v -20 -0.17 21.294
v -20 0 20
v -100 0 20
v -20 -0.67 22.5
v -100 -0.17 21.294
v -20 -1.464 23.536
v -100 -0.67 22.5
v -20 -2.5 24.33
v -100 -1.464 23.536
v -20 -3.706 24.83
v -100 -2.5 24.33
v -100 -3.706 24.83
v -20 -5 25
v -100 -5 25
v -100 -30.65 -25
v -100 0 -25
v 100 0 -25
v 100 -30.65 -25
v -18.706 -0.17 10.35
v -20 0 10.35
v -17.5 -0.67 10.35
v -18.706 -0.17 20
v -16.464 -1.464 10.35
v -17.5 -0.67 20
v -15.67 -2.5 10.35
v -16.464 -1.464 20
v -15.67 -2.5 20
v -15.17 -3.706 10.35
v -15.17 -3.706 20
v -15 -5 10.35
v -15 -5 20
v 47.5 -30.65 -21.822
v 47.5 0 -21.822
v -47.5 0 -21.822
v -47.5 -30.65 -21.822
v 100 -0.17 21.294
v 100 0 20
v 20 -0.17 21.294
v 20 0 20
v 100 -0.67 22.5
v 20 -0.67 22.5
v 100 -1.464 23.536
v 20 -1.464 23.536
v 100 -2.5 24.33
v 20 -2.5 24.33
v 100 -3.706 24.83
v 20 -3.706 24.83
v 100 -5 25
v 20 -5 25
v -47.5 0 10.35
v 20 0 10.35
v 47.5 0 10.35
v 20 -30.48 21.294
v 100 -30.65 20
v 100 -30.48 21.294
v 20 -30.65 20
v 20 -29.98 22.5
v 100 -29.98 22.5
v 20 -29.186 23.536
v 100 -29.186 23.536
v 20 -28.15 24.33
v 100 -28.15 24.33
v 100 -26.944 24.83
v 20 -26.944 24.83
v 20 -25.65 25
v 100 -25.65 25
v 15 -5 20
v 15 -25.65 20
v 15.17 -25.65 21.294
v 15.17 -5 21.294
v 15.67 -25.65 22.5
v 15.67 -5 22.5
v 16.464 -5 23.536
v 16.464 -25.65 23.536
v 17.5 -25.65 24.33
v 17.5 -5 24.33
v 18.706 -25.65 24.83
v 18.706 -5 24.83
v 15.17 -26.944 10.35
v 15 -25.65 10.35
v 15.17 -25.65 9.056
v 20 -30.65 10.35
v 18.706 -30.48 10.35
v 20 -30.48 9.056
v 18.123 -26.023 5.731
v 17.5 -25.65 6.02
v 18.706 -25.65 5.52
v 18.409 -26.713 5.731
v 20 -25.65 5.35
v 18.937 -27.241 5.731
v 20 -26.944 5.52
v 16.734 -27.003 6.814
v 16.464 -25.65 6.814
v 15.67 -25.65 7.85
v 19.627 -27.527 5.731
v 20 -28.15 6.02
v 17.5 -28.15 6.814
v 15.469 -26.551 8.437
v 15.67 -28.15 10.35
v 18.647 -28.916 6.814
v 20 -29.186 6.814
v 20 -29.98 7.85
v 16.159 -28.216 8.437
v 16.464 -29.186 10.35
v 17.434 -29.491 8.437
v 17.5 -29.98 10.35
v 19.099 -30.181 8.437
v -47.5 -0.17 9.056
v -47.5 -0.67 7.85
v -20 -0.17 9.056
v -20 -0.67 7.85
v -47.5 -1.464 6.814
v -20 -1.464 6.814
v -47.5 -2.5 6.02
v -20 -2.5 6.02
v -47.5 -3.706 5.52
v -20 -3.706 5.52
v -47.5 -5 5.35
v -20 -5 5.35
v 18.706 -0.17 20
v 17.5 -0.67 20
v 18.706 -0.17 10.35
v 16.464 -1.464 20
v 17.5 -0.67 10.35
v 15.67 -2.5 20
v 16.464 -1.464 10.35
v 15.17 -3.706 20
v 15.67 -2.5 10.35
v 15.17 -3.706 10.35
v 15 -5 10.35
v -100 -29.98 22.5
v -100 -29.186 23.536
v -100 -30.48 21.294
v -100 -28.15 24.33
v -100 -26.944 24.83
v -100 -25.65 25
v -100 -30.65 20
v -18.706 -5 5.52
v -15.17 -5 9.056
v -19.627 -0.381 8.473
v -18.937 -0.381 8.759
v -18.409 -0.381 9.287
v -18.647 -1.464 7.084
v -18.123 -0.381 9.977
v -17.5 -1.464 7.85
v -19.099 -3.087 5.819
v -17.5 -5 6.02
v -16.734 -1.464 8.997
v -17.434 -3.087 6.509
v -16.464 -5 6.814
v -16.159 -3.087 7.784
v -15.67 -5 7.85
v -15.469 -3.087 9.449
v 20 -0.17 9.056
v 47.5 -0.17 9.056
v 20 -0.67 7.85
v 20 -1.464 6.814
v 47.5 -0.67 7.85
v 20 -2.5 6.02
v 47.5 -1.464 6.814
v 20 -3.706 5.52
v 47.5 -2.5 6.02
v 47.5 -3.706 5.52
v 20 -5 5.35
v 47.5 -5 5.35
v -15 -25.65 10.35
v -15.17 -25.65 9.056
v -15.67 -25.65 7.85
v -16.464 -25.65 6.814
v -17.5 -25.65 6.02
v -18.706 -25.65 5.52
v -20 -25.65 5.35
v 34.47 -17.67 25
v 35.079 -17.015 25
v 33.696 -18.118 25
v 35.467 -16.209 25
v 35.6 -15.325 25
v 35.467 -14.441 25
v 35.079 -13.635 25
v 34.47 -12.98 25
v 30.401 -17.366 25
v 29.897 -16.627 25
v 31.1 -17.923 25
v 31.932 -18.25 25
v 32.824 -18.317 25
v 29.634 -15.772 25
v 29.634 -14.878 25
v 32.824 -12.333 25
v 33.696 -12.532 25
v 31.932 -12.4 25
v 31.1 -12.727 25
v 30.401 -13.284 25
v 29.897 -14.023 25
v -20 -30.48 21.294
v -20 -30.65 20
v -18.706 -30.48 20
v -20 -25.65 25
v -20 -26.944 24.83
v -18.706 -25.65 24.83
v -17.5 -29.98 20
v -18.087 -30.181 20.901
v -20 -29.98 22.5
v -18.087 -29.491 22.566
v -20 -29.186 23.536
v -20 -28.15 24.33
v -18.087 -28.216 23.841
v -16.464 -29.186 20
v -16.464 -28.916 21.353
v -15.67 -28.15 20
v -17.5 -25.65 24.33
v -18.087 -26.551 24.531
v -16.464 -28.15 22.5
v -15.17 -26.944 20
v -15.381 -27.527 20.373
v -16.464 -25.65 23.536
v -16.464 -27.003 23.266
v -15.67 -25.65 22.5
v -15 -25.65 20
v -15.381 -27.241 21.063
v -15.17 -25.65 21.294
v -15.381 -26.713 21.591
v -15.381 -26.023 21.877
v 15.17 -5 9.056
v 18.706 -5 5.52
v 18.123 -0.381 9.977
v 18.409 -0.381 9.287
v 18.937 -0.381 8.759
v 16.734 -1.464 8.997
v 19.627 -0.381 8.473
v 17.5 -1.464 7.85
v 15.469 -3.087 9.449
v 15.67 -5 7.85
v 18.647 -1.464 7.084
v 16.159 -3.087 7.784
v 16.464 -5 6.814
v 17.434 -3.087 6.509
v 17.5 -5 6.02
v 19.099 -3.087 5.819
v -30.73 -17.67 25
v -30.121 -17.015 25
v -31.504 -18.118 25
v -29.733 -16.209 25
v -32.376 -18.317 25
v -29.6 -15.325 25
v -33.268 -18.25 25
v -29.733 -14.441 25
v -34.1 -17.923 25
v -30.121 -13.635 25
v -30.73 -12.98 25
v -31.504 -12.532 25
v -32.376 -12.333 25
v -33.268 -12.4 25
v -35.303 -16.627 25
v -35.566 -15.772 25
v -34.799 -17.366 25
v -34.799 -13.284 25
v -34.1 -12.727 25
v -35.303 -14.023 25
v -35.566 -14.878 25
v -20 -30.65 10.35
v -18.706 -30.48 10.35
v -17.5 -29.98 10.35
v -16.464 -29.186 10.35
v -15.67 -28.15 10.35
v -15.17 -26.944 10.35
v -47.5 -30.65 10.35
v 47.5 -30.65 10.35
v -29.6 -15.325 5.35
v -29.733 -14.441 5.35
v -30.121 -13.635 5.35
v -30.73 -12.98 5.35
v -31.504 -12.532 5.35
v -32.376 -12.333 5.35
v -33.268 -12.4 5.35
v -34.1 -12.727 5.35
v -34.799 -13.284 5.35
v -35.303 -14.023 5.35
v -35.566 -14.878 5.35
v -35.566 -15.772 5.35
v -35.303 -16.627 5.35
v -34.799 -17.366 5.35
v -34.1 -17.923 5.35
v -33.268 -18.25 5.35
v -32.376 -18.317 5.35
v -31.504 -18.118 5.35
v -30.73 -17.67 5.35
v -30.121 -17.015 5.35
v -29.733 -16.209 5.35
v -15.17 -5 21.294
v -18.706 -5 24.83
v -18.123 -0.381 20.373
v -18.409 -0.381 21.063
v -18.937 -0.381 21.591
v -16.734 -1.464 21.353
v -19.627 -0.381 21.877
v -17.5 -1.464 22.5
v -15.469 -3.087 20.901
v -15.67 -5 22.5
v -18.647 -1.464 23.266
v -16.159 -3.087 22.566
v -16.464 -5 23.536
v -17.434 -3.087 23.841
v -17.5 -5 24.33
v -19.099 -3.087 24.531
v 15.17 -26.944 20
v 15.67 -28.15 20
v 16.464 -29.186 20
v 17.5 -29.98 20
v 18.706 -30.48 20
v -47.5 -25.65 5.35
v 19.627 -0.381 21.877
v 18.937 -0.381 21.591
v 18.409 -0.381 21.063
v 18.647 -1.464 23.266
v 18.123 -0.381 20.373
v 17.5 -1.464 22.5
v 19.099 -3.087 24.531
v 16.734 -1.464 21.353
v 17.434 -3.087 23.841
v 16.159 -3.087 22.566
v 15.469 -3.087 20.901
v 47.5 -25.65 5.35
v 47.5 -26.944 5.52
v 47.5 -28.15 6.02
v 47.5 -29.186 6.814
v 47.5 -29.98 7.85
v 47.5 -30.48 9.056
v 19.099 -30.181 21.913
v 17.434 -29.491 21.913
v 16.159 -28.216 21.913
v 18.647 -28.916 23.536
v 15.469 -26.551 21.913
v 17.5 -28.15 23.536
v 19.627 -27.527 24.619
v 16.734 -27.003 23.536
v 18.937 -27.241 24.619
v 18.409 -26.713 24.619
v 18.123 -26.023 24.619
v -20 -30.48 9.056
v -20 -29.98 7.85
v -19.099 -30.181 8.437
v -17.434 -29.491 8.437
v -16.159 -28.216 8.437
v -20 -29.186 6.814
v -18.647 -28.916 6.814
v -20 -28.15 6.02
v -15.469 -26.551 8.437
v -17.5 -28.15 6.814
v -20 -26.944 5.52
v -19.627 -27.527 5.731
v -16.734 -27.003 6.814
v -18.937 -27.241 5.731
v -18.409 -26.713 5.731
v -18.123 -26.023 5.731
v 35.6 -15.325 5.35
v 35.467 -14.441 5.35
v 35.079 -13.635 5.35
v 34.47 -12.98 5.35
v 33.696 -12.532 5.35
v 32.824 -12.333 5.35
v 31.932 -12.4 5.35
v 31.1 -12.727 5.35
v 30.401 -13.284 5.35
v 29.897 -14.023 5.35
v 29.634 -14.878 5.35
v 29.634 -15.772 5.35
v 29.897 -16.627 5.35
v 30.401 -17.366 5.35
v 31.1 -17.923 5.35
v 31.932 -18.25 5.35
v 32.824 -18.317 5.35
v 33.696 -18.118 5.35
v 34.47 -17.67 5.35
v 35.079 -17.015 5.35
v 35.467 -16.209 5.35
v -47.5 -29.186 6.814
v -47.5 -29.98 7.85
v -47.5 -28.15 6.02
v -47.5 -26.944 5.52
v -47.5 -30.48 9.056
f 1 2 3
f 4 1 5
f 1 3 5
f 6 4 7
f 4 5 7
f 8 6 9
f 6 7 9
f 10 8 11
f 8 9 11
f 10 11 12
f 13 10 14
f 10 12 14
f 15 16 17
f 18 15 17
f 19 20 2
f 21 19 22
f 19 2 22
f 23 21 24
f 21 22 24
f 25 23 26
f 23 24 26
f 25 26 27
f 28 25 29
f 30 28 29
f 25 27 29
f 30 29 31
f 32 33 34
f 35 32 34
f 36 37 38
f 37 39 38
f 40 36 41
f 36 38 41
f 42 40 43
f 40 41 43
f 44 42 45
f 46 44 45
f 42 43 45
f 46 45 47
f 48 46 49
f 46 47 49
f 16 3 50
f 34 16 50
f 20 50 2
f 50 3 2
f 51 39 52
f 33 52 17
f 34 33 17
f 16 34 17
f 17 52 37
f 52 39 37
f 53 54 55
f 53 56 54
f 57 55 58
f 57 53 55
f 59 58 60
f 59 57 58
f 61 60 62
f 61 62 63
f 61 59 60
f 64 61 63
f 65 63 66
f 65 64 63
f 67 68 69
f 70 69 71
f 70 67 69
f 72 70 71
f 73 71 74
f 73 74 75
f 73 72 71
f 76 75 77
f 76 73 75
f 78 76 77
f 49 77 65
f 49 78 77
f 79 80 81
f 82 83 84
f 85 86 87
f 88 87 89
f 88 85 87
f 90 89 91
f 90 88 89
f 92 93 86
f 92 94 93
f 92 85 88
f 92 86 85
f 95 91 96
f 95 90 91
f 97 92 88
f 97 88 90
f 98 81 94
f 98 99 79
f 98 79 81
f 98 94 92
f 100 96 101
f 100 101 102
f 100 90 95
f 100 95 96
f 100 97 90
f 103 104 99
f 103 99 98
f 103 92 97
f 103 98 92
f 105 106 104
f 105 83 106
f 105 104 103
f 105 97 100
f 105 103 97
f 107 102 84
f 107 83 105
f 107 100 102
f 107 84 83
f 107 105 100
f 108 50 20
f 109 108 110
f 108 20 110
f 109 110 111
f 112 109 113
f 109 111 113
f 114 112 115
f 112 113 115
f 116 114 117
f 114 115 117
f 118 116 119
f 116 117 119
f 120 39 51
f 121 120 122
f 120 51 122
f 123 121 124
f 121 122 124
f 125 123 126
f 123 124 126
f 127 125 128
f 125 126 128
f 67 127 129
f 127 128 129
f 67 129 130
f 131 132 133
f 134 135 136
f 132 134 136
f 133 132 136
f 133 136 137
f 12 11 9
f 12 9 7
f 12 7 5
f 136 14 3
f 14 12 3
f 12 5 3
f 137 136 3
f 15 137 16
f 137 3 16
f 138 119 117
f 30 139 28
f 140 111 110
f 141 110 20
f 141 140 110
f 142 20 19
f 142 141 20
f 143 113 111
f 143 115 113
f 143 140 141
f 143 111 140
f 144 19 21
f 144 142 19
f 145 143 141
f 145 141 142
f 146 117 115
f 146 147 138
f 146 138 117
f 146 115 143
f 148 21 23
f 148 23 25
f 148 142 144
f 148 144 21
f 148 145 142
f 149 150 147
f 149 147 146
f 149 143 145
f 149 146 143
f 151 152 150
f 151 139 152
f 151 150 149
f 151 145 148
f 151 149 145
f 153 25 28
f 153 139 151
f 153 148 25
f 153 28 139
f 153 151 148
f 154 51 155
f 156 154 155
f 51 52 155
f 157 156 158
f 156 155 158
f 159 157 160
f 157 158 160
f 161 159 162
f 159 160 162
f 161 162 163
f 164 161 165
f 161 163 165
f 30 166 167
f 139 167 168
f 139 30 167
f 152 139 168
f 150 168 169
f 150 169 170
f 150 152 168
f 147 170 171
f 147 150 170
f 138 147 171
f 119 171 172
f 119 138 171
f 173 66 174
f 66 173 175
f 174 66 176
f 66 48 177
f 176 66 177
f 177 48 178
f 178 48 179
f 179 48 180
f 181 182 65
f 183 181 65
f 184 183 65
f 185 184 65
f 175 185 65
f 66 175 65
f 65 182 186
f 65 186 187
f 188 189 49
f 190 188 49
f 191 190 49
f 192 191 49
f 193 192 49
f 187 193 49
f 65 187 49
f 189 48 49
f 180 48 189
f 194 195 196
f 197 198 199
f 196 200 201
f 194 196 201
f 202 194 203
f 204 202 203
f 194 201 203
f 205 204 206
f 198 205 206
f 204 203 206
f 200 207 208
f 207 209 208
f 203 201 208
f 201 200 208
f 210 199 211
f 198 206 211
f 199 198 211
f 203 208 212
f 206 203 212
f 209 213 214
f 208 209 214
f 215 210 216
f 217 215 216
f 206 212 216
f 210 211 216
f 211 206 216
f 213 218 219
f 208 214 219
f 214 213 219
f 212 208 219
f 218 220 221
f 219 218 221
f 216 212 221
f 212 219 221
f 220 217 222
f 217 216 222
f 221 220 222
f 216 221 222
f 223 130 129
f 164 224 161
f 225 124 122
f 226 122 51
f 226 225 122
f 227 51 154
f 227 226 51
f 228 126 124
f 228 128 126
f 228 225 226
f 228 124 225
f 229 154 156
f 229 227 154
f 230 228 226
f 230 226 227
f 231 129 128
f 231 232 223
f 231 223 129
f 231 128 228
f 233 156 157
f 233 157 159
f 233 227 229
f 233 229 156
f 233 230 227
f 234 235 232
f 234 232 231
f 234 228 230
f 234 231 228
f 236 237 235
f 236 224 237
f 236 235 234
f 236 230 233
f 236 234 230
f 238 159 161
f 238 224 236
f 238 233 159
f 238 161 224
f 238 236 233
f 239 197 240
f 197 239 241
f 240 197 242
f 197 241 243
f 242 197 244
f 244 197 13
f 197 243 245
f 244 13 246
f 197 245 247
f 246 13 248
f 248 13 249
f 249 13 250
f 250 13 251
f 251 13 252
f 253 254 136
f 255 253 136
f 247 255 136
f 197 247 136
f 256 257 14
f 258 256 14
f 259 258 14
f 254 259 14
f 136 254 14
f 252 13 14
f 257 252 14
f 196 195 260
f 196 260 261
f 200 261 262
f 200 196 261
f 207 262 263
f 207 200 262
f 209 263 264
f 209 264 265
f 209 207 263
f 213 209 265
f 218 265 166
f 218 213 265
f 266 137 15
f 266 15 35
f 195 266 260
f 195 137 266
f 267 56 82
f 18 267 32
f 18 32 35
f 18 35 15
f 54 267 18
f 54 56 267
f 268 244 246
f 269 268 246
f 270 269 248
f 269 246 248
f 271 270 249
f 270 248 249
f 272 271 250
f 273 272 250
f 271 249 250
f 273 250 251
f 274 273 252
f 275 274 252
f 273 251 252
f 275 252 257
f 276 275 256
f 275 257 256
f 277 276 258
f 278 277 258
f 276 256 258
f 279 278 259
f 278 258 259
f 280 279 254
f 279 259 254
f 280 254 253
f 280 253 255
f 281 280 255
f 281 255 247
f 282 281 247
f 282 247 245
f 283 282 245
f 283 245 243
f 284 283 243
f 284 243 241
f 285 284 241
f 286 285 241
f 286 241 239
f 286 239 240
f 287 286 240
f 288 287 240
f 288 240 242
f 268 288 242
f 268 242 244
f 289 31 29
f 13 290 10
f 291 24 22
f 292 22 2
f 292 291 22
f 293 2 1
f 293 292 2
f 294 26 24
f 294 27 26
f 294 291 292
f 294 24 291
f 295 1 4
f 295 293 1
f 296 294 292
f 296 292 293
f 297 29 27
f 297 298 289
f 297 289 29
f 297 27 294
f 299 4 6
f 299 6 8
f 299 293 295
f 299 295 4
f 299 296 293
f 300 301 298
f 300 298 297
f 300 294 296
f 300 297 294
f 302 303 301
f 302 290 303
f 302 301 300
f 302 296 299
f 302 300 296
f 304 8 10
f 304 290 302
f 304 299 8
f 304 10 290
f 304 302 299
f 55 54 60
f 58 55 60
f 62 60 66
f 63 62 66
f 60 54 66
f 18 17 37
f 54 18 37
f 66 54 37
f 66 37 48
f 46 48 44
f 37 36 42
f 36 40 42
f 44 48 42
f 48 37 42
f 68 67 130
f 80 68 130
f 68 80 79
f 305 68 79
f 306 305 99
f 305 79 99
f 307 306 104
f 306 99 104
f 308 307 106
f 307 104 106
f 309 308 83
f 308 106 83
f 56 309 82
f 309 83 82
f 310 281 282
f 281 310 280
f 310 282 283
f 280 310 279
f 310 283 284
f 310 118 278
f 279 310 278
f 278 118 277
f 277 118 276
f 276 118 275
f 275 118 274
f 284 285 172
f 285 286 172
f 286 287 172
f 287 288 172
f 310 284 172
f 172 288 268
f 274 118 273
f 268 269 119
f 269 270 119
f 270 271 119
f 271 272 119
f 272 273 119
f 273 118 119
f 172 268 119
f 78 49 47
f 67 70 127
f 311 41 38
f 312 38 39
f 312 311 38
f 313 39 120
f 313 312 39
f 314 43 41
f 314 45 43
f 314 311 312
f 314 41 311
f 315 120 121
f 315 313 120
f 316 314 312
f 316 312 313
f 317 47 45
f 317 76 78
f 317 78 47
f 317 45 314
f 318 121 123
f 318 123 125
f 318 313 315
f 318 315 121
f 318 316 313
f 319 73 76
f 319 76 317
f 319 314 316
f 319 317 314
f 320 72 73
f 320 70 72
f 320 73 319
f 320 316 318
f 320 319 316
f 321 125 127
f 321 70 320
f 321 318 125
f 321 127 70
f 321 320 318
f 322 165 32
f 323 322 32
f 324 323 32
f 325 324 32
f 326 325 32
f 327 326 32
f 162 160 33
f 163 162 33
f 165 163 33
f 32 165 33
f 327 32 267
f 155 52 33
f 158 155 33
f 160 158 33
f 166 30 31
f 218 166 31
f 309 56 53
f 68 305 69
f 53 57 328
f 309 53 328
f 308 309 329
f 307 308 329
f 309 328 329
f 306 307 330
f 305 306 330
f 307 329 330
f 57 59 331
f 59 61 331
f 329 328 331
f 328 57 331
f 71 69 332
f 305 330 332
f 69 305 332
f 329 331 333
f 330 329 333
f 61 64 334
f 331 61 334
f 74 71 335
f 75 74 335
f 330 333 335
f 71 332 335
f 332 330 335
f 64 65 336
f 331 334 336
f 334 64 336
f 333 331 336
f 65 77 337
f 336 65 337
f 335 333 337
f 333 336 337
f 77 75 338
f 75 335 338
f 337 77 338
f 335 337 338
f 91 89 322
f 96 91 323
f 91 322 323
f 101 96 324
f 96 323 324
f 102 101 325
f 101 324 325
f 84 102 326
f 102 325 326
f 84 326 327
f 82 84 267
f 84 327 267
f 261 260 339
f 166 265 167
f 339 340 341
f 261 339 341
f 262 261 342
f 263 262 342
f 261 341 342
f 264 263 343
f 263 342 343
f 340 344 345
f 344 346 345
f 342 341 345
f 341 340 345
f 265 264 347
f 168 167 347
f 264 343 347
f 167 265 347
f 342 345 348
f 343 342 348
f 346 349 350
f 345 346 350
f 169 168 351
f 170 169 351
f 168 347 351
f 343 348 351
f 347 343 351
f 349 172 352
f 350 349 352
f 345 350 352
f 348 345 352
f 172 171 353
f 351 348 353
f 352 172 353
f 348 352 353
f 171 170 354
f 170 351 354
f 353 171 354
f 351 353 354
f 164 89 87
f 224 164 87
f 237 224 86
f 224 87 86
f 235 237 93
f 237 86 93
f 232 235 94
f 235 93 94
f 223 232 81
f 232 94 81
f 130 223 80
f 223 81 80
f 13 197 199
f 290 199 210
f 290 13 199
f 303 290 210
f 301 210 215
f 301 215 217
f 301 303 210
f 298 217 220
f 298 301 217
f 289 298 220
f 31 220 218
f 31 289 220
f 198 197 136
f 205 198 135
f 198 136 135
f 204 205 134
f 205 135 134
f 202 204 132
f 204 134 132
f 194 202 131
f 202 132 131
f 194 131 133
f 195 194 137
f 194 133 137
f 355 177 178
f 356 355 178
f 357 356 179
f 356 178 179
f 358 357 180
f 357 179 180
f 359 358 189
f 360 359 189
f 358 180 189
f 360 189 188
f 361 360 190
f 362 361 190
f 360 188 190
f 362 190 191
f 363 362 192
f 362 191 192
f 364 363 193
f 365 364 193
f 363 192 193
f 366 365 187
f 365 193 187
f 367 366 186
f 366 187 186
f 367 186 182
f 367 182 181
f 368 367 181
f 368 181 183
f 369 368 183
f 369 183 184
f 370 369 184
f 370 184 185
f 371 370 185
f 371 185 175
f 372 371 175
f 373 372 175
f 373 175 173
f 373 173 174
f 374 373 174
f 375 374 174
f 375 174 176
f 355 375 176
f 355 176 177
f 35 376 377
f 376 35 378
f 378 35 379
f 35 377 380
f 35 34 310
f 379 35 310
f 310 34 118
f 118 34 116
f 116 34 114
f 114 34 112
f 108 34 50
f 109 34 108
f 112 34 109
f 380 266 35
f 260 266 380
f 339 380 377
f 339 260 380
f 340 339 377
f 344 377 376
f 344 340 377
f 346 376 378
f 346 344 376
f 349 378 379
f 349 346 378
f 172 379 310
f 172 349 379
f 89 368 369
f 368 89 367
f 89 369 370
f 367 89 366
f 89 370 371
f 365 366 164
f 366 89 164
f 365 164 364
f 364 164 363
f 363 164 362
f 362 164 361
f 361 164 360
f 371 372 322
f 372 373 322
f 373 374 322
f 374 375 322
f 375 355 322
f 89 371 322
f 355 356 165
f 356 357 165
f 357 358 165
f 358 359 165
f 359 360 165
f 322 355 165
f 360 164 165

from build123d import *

# Parameters (mm, degrees)
F1_DEPTH  = 30.65
F2_R      = 5
F3_R      = 5
F4_R      = 5
F5_R      = 5
F6_R      = 5
F7_R      = 5
F8_R      = 5
F9_R      = 5
F10_R     = 3
F11_DEPTH = 20


with BuildPart() as f1:
    # F0 (on Front) → F1 (new body)
    with BuildSketch(Plane.XZ):
        Polygon((-100, 25), (-100, -25), (100, -25), (100, 25), (15, 25), (15, 5.35), (47.5, 5.35), (47.5, -7.066266), (47.5, -21.822188), (0, -21.822188), (-47.5, -21.822188), (-47.5, -7.066266), (-47.5, 5.35), (-15, 5.35), (-15, 25), align=None)
    extrude(amount=F1_DEPTH)

    # F2
    f2_edges = [f1.edges().sort_by_distance(p)[0] for p in [
        (-57.5, -30.65, 25),
    ]]
    fillet(f2_edges, radius=F2_R)

    # F3
    f3_edges = [f1.edges().sort_by_distance(p)[0] for p in [
        (-15, -30.65, 12.675),
    ]]
    fillet(f3_edges, radius=F3_R)

    # F4
    f4_edges = [f1.edges().sort_by_distance(p)[0] for p in [
        (-33.75, -30.65, 5.35),
    ]]
    fillet(f4_edges, radius=F4_R)

    # F5
    f5_edges = [f1.edges().sort_by_distance(p)[0] for p in [
        (15, -30.65, 15.175),
    ]]
    fillet(f5_edges, radius=F5_R)

    # F6
    f6_edges = [f1.edges().sort_by_distance(p)[0] for p in [
        (33.75, -30.65, 5.35),
    ]]
    fillet(f6_edges, radius=F6_R)

    # F7
    f7_edges = [f1.edges().sort_by_distance(p)[0] for p in [
        (60, -30.65, 25),
    ]]
    fillet(f7_edges, radius=F7_R)

    # F8
    f8_edges = [f1.edges().sort_by_distance(p)[0] for p in [
        (60, 0, 25),
    ]]
    fillet(f8_edges, radius=F8_R)

    # F9
    f9_edges = [f1.edges().sort_by_distance(p)[0] for p in [
        (-33.75, 0, 5.35),
    ]]
    fillet(f9_edges, radius=F9_R)

    # F10 (on face) → F11 (cut)
    with BuildSketch(Plane.XY.offset(25)):
        with Locations((-32.6, -15.325)):
            Circle(F10_R)
        with Locations((32.6, -15.325)):
            Circle(F10_R)
    extrude(amount=-F11_DEPTH, mode=Mode.SUBTRACT)


solid = f1.part
